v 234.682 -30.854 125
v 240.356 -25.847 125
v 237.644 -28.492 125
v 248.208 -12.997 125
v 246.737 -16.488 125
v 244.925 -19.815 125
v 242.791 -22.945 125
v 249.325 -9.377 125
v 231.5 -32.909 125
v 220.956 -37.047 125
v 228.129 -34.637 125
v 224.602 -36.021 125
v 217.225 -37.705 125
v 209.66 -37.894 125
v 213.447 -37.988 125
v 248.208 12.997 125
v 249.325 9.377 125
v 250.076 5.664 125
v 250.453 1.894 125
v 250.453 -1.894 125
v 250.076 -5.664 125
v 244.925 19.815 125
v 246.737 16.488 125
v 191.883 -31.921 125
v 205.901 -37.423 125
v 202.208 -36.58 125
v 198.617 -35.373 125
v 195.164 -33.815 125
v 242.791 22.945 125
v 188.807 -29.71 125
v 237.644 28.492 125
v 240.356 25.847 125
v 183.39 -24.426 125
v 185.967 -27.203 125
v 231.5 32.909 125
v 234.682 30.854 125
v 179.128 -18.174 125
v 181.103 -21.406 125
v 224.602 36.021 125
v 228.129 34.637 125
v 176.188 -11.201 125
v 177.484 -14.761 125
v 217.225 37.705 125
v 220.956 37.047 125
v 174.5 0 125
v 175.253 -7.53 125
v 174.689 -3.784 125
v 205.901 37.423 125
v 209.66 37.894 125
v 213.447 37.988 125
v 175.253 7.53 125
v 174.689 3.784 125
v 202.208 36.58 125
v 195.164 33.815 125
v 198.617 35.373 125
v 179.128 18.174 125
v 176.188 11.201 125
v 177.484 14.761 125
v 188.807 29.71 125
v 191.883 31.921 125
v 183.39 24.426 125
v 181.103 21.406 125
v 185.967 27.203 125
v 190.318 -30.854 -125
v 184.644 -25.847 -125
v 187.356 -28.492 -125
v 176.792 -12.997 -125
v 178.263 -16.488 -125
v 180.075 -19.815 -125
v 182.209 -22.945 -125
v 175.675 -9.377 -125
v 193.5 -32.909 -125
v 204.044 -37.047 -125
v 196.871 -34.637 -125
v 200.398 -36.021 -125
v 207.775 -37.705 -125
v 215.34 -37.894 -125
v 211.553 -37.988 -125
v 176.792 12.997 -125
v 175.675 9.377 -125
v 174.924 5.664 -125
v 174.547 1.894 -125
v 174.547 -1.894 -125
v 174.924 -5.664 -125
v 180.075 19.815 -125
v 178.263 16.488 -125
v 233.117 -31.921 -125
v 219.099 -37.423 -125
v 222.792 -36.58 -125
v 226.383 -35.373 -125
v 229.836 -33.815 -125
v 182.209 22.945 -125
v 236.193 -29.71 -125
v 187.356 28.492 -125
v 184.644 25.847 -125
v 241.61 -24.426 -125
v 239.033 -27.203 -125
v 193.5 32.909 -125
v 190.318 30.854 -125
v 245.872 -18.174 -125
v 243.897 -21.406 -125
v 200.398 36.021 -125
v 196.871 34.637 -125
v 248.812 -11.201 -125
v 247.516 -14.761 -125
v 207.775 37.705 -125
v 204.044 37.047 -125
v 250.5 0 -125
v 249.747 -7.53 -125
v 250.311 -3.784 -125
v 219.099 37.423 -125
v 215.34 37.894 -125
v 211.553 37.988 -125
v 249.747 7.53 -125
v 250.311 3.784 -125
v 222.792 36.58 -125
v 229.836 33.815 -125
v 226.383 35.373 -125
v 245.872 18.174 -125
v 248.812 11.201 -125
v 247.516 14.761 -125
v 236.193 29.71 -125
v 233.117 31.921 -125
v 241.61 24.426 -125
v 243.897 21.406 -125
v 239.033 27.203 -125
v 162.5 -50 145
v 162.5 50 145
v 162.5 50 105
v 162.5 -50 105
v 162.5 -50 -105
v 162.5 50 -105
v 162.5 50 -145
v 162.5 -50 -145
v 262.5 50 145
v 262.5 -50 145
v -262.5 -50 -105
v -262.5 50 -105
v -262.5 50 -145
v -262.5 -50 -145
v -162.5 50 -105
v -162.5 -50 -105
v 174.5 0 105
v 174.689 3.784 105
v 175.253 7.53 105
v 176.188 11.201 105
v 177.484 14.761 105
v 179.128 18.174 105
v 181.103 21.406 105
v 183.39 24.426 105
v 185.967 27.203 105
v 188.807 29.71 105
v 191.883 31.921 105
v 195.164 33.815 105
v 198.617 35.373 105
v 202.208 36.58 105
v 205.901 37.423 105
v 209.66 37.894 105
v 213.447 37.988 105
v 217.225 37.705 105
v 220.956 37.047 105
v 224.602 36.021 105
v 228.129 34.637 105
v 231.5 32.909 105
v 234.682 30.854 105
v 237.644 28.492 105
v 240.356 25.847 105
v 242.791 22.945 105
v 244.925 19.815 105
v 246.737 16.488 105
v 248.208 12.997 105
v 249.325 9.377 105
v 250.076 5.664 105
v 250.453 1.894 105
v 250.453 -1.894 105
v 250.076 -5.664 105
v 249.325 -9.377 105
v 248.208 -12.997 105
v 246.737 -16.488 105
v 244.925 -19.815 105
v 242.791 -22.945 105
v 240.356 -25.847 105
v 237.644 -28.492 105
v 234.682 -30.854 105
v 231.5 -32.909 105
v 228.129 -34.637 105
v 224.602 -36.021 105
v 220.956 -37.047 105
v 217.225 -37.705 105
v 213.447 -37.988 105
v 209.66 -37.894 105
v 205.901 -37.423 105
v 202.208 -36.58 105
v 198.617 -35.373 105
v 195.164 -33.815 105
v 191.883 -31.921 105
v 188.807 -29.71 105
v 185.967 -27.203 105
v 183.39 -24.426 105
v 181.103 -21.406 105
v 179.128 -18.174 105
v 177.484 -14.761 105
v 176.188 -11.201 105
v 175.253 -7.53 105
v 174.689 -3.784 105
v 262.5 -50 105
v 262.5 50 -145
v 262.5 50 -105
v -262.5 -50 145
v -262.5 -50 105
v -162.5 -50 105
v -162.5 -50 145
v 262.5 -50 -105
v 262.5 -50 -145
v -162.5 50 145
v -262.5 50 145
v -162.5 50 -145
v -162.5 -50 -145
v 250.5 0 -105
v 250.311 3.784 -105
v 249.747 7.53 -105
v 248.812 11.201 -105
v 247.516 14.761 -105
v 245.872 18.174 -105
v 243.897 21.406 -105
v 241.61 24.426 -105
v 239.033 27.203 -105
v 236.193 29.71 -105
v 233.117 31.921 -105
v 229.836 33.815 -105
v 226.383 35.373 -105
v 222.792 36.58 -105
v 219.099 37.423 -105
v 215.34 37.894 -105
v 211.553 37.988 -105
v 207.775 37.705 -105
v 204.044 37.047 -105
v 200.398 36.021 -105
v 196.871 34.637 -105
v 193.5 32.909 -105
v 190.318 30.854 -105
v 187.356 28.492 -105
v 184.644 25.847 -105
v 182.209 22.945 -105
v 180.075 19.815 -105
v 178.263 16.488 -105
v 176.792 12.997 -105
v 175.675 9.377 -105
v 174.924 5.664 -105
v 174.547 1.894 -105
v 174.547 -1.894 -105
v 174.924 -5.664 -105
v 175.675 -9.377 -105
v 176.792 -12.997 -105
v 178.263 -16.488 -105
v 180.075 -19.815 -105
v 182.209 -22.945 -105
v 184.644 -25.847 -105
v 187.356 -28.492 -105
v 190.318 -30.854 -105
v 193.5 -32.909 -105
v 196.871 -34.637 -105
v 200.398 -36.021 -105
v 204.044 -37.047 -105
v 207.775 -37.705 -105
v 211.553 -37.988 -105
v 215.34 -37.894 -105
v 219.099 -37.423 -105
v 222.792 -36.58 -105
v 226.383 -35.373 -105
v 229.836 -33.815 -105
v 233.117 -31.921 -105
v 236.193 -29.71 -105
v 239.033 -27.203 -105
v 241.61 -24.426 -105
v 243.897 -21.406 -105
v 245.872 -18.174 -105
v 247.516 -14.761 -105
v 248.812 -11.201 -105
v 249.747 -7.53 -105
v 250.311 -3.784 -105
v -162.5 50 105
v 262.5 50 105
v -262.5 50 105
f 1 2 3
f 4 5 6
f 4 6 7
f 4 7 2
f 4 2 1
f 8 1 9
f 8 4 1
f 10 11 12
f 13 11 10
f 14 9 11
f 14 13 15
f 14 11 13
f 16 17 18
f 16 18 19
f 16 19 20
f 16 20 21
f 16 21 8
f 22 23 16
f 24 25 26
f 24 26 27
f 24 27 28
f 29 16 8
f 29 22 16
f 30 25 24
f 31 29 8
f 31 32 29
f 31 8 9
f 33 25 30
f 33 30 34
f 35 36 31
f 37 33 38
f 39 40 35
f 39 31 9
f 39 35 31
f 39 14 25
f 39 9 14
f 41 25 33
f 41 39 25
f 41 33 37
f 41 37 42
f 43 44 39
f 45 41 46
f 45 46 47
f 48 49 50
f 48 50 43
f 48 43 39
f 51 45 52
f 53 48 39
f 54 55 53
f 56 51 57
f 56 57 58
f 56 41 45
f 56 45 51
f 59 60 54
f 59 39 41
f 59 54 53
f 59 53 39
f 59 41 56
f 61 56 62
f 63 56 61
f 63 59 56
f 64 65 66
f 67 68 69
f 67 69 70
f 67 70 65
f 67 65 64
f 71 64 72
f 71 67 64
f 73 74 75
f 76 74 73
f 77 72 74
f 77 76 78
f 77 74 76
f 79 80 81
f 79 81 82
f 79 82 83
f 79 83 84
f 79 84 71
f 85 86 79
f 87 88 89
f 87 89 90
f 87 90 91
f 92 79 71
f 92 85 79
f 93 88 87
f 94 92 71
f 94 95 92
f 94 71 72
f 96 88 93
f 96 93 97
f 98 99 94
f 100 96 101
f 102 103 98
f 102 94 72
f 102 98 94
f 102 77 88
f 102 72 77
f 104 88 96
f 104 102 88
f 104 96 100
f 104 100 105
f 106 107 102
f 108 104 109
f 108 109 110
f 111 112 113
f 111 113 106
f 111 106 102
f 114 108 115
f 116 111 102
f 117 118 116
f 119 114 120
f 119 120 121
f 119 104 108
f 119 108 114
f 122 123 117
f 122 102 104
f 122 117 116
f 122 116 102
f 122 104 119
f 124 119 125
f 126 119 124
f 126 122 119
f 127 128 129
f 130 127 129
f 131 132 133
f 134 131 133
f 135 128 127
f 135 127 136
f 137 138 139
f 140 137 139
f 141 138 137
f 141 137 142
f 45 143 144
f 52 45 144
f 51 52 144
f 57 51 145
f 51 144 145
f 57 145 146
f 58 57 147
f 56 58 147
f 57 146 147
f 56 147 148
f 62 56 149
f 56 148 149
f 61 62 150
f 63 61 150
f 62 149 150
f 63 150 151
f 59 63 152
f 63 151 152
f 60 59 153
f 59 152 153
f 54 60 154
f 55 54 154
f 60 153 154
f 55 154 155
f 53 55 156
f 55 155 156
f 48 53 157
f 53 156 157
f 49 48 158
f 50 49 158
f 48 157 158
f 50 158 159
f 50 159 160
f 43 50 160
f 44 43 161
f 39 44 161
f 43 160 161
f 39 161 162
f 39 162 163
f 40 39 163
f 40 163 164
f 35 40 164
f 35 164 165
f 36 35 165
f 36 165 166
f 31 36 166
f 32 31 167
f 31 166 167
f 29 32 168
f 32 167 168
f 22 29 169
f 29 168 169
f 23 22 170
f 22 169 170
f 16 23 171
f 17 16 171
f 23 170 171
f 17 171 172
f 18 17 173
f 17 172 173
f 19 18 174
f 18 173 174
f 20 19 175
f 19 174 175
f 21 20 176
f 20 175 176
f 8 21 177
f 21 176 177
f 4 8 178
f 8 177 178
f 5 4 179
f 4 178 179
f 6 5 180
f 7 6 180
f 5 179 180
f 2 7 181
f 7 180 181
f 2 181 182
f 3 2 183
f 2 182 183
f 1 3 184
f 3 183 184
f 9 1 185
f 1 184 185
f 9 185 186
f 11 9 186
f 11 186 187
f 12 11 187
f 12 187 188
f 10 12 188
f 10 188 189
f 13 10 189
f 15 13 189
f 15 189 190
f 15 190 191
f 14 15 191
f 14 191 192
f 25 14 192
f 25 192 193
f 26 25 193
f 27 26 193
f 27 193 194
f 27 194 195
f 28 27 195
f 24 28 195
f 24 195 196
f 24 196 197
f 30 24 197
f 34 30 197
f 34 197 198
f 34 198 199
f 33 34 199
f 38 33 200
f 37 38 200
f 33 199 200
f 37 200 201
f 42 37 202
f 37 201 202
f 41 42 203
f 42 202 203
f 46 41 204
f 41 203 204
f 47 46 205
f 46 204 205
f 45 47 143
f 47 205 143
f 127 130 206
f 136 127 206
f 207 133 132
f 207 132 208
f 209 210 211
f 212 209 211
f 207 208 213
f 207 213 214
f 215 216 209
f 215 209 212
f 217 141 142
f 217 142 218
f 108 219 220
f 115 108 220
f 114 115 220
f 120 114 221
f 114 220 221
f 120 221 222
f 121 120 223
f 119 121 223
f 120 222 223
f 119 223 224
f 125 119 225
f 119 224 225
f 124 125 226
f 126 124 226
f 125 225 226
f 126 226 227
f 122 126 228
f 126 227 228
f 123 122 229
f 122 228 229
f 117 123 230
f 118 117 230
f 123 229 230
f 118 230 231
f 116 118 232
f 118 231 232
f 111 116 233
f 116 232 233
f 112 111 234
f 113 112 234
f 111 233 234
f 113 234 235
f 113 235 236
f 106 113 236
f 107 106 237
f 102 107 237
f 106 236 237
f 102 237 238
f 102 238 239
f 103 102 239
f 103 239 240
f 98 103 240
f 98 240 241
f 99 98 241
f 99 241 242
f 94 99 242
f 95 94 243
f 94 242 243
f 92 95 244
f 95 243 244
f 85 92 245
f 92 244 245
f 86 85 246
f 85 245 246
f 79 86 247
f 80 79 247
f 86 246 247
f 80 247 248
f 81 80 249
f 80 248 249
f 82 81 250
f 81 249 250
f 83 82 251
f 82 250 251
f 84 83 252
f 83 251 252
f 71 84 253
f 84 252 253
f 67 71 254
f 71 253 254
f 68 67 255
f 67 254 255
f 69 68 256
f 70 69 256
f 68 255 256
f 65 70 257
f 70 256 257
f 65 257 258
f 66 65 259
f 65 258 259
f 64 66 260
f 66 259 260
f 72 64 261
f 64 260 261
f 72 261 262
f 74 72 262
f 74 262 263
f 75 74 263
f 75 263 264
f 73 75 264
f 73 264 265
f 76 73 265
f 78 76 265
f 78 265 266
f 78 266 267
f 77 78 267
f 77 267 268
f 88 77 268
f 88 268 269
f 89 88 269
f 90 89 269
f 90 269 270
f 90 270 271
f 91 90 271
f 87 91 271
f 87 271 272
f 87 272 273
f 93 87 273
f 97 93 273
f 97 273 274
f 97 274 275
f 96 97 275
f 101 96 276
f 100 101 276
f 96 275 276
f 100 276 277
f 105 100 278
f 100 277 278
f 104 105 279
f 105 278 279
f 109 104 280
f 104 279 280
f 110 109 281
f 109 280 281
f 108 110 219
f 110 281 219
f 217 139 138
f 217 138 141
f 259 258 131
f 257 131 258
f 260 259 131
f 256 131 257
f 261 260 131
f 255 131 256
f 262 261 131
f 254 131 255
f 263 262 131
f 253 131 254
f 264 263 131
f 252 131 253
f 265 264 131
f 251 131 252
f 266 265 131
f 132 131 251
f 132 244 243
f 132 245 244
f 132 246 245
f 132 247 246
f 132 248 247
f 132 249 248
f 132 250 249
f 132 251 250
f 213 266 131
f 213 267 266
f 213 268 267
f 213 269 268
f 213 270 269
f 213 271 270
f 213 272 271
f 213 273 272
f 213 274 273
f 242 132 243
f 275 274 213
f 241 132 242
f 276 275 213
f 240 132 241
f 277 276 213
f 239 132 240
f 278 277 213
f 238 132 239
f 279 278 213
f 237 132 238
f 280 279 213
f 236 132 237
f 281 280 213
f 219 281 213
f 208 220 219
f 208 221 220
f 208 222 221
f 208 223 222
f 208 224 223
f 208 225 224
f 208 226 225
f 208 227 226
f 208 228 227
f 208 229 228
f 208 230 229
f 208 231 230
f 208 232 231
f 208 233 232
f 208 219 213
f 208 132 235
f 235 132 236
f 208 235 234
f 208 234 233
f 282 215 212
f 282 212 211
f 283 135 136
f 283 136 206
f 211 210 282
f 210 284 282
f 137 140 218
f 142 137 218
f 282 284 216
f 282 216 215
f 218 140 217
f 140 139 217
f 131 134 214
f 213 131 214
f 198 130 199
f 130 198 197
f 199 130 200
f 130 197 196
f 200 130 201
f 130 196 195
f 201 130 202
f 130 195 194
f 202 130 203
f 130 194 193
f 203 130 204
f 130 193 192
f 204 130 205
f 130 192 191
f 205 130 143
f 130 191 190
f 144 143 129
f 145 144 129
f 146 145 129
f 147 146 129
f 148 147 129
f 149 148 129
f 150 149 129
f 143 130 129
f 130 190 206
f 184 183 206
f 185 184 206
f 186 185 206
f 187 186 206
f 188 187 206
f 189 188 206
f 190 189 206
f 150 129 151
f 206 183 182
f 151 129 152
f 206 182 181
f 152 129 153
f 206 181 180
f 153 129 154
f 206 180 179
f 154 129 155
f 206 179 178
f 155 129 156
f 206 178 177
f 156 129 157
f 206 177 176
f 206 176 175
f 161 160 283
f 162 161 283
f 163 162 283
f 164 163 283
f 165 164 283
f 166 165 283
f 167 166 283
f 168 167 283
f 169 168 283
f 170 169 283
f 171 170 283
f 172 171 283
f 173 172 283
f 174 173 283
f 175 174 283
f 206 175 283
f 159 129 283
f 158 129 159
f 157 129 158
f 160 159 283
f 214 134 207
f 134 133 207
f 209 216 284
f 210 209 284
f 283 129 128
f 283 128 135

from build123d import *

# Parameters (mm, degrees)
SKETCH1_W             = 100
SKETCH1_H             = 40
BOSS_EXTRUDE1_DEPTH   = 50
BOSS_EXTRUDE1_2_DEPTH = 50
BOSS_EXTRUDE1_3_DEPTH = 50
BOSS_EXTRUDE1_4_DEPTH = 50
SKETCH3_R             = 38
CUT_EXTRUDE5_DEPTH    = 20
SKETCH4_R             = 38
CUT_EXTRUDE6_DEPTH    = 20


with BuildPart() as part:
    # Sketch1 → Boss-Extrude1 (new body, symmetric)
    with BuildSketch(Plane(origin=(0, 0, 0), x_dir=(1, 0, 0), z_dir=(0, 1, 0))):
        with Locations((212.5, 125)):
            Rectangle(SKETCH1_W, SKETCH1_H)
    extrude(amount=BOSS_EXTRUDE1_DEPTH, both=True)

    # Sketch4 → Cut-Extrude6 (cut)
    with BuildSketch(Plane.XY.offset(-105)):
        with Locations((212.5, 0)):
            Circle(SKETCH4_R)
    extrude(amount=-CUT_EXTRUDE6_DEPTH, mode=Mode.SUBTRACT)


with BuildPart() as body_2:
    # Sketch1 → Boss-Extrude1 2 (new body, symmetric)
    with BuildSketch(Plane(origin=(0, 0, 0), x_dir=(1, 0, 0), z_dir=(0, 1, 0))):
        with Locations((212.5, -125)):
            Rectangle(SKETCH1_W, SKETCH1_H)
    extrude(amount=BOSS_EXTRUDE1_2_DEPTH, both=True)

    # Sketch3 → Cut-Extrude5 (cut)
    with BuildSketch(Plane(origin=(0, 0, 105), x_dir=(-1, 0, 0), z_dir=(0, 0, -1))):
        with Locations((-212.5, 0)):
            Circle(SKETCH3_R)
    extrude(amount=-CUT_EXTRUDE5_DEPTH, mode=Mode.SUBTRACT)


with BuildPart() as body_3:
    # Sketch1 → Boss-Extrude1 3 (new body, symmetric)
    with BuildSketch(Plane(origin=(0, 0, 0), x_dir=(1, 0, 0), z_dir=(0, 1, 0))):
        with Locations((-212.5, -125)):
            Rectangle(SKETCH1_W, SKETCH1_H)
    extrude(amount=BOSS_EXTRUDE1_3_DEPTH, both=True)


with BuildPart() as body_4:
    # Sketch1 → Boss-Extrude1 4 (new body, symmetric)
    with BuildSketch(Plane(origin=(0, 0, 0), x_dir=(1, 0, 0), z_dir=(0, 1, 0))):
        with Locations((-212.5, 125)):
            Rectangle(SKETCH1_W, SKETCH1_H)
    extrude(amount=BOSS_EXTRUDE1_4_DEPTH, both=True)


solid = Compound([part.part, body_2.part, body_3.part, body_4.part])
